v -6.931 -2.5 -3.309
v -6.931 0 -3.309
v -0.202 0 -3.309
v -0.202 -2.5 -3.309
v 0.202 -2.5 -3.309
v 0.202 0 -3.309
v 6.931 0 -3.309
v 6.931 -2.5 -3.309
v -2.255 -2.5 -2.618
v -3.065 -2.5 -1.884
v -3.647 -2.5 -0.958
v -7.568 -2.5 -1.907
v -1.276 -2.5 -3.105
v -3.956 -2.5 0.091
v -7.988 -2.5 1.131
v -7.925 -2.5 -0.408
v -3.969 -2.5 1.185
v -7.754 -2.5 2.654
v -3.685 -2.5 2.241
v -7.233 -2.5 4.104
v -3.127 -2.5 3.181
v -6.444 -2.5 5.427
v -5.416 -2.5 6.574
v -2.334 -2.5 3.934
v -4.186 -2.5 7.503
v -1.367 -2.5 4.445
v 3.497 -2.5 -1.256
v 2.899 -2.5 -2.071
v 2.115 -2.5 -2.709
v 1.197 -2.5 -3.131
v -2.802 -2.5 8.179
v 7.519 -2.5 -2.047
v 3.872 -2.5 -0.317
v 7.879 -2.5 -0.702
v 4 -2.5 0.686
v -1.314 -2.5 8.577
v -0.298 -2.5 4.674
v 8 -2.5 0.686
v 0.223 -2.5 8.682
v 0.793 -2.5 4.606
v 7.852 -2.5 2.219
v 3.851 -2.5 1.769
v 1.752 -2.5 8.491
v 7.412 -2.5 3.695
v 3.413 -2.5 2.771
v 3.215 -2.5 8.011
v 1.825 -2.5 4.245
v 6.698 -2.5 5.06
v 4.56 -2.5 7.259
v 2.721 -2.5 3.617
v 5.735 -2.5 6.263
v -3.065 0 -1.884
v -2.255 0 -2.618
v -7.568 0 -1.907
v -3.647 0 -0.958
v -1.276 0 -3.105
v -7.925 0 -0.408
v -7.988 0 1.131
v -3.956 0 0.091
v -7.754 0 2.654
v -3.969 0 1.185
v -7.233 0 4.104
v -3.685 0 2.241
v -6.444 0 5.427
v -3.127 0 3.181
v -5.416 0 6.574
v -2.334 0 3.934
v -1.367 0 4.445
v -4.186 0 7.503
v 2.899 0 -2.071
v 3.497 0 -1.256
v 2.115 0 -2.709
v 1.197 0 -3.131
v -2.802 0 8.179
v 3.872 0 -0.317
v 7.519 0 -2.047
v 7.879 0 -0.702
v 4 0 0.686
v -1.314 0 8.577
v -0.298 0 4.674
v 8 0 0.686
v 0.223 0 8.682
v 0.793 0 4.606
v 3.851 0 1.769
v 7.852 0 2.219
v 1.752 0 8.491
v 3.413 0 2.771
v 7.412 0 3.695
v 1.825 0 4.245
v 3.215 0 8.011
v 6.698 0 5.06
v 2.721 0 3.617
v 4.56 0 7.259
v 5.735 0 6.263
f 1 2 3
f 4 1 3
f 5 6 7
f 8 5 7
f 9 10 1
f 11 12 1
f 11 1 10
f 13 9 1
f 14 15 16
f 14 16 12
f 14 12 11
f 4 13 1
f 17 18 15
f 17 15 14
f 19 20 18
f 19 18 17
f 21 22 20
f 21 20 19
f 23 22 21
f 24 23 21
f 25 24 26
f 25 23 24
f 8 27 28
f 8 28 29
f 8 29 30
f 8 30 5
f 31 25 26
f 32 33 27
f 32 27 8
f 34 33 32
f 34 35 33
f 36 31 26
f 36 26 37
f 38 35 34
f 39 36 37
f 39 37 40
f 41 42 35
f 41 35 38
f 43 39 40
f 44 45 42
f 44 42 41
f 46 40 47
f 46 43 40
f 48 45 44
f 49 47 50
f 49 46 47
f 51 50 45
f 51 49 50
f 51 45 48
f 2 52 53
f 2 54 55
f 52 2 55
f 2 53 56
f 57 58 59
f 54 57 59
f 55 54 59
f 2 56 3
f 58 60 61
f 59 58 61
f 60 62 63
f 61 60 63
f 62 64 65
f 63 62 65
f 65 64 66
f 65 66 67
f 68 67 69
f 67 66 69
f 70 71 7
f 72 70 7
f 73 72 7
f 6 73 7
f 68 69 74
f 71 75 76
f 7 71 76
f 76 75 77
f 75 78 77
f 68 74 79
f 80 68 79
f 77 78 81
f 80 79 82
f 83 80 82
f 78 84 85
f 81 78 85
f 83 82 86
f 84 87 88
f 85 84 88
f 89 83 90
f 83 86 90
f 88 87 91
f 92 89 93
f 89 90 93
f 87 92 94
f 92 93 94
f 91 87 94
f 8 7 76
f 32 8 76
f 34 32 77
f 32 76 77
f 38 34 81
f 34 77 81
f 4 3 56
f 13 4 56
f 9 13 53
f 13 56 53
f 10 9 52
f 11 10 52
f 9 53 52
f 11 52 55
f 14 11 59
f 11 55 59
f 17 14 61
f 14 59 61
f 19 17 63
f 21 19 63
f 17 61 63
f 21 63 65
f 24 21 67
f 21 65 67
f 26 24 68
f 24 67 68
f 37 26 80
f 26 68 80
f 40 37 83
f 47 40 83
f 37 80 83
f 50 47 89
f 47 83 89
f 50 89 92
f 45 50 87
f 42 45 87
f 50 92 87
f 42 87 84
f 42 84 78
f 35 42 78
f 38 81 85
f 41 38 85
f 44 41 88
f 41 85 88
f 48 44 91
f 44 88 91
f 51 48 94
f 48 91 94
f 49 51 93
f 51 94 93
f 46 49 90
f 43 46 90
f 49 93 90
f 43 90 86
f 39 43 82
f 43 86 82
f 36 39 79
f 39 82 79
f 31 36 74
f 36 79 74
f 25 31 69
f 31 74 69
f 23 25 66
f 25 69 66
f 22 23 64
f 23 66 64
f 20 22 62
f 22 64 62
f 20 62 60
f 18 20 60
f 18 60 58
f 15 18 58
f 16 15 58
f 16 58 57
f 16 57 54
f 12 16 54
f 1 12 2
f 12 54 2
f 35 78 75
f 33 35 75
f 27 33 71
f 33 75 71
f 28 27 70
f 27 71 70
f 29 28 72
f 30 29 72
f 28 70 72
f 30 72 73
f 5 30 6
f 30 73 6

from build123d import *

# Parameters (mm, degrees)
F1_DEPTH = 2.5


# Not quite as in the source:
# - a feature names something its author has since deleted; it is built from what else it names


with BuildPart() as f1:
    # F0 (on Front) → F1 (new body)
    with BuildSketch(Plane.XZ):
        with BuildLine():
            ThreePointArc((-0.2018715048, -3.3093462615), (-2.7561308007, 3.5844774855), (4, 0.6855564776))
            ThreePointArc((4, 0.6855564776), (2.8989210078, -2.070574323), (0.2018715048, -3.3093462615))
            Line((0.2018715048, -3.3093462615), (4.4766898602, -3.3093462615))
            ThreePointArc((4.4766898602, -3.3093462615), (5.6062527218, -1.4521830807), (6, 0.6855564776))
            ThreePointArc((6, 0.6855564776), (-2.1377395584, 6.2918091994), (-4.4766898602, -3.3093462615))
            Line((-4.4766898602, -3.3093462615), (-0.2018715048, -3.3093462615))
        make_face()
        with BuildLine():
            Line((-6.9311436361, -3.3093462615), (-4.4766898602, -3.3093462615))
            ThreePointArc((-4.4766898602, -3.3093462615), (-2.1377395584, 6.2918091994), (6, 0.6855564776))
            ThreePointArc((6, 0.6855564776), (5.6062527218, -1.4521830807), (4.4766898602, -3.3093462615))
            Line((4.4766898602, -3.3093462615), (6.9311436361, -3.3093462615))
            ThreePointArc((6.9311436361, -3.3093462615), (7.7281676059, -1.3821537186), (8, 0.6855564776))
            ThreePointArc((8, 0.6855564776), (-2.0677101962, 8.4137240835), (-6.9311436361, -3.3093462615))
        make_face()
    extrude(amount=F1_DEPTH)


solid = f1.part
